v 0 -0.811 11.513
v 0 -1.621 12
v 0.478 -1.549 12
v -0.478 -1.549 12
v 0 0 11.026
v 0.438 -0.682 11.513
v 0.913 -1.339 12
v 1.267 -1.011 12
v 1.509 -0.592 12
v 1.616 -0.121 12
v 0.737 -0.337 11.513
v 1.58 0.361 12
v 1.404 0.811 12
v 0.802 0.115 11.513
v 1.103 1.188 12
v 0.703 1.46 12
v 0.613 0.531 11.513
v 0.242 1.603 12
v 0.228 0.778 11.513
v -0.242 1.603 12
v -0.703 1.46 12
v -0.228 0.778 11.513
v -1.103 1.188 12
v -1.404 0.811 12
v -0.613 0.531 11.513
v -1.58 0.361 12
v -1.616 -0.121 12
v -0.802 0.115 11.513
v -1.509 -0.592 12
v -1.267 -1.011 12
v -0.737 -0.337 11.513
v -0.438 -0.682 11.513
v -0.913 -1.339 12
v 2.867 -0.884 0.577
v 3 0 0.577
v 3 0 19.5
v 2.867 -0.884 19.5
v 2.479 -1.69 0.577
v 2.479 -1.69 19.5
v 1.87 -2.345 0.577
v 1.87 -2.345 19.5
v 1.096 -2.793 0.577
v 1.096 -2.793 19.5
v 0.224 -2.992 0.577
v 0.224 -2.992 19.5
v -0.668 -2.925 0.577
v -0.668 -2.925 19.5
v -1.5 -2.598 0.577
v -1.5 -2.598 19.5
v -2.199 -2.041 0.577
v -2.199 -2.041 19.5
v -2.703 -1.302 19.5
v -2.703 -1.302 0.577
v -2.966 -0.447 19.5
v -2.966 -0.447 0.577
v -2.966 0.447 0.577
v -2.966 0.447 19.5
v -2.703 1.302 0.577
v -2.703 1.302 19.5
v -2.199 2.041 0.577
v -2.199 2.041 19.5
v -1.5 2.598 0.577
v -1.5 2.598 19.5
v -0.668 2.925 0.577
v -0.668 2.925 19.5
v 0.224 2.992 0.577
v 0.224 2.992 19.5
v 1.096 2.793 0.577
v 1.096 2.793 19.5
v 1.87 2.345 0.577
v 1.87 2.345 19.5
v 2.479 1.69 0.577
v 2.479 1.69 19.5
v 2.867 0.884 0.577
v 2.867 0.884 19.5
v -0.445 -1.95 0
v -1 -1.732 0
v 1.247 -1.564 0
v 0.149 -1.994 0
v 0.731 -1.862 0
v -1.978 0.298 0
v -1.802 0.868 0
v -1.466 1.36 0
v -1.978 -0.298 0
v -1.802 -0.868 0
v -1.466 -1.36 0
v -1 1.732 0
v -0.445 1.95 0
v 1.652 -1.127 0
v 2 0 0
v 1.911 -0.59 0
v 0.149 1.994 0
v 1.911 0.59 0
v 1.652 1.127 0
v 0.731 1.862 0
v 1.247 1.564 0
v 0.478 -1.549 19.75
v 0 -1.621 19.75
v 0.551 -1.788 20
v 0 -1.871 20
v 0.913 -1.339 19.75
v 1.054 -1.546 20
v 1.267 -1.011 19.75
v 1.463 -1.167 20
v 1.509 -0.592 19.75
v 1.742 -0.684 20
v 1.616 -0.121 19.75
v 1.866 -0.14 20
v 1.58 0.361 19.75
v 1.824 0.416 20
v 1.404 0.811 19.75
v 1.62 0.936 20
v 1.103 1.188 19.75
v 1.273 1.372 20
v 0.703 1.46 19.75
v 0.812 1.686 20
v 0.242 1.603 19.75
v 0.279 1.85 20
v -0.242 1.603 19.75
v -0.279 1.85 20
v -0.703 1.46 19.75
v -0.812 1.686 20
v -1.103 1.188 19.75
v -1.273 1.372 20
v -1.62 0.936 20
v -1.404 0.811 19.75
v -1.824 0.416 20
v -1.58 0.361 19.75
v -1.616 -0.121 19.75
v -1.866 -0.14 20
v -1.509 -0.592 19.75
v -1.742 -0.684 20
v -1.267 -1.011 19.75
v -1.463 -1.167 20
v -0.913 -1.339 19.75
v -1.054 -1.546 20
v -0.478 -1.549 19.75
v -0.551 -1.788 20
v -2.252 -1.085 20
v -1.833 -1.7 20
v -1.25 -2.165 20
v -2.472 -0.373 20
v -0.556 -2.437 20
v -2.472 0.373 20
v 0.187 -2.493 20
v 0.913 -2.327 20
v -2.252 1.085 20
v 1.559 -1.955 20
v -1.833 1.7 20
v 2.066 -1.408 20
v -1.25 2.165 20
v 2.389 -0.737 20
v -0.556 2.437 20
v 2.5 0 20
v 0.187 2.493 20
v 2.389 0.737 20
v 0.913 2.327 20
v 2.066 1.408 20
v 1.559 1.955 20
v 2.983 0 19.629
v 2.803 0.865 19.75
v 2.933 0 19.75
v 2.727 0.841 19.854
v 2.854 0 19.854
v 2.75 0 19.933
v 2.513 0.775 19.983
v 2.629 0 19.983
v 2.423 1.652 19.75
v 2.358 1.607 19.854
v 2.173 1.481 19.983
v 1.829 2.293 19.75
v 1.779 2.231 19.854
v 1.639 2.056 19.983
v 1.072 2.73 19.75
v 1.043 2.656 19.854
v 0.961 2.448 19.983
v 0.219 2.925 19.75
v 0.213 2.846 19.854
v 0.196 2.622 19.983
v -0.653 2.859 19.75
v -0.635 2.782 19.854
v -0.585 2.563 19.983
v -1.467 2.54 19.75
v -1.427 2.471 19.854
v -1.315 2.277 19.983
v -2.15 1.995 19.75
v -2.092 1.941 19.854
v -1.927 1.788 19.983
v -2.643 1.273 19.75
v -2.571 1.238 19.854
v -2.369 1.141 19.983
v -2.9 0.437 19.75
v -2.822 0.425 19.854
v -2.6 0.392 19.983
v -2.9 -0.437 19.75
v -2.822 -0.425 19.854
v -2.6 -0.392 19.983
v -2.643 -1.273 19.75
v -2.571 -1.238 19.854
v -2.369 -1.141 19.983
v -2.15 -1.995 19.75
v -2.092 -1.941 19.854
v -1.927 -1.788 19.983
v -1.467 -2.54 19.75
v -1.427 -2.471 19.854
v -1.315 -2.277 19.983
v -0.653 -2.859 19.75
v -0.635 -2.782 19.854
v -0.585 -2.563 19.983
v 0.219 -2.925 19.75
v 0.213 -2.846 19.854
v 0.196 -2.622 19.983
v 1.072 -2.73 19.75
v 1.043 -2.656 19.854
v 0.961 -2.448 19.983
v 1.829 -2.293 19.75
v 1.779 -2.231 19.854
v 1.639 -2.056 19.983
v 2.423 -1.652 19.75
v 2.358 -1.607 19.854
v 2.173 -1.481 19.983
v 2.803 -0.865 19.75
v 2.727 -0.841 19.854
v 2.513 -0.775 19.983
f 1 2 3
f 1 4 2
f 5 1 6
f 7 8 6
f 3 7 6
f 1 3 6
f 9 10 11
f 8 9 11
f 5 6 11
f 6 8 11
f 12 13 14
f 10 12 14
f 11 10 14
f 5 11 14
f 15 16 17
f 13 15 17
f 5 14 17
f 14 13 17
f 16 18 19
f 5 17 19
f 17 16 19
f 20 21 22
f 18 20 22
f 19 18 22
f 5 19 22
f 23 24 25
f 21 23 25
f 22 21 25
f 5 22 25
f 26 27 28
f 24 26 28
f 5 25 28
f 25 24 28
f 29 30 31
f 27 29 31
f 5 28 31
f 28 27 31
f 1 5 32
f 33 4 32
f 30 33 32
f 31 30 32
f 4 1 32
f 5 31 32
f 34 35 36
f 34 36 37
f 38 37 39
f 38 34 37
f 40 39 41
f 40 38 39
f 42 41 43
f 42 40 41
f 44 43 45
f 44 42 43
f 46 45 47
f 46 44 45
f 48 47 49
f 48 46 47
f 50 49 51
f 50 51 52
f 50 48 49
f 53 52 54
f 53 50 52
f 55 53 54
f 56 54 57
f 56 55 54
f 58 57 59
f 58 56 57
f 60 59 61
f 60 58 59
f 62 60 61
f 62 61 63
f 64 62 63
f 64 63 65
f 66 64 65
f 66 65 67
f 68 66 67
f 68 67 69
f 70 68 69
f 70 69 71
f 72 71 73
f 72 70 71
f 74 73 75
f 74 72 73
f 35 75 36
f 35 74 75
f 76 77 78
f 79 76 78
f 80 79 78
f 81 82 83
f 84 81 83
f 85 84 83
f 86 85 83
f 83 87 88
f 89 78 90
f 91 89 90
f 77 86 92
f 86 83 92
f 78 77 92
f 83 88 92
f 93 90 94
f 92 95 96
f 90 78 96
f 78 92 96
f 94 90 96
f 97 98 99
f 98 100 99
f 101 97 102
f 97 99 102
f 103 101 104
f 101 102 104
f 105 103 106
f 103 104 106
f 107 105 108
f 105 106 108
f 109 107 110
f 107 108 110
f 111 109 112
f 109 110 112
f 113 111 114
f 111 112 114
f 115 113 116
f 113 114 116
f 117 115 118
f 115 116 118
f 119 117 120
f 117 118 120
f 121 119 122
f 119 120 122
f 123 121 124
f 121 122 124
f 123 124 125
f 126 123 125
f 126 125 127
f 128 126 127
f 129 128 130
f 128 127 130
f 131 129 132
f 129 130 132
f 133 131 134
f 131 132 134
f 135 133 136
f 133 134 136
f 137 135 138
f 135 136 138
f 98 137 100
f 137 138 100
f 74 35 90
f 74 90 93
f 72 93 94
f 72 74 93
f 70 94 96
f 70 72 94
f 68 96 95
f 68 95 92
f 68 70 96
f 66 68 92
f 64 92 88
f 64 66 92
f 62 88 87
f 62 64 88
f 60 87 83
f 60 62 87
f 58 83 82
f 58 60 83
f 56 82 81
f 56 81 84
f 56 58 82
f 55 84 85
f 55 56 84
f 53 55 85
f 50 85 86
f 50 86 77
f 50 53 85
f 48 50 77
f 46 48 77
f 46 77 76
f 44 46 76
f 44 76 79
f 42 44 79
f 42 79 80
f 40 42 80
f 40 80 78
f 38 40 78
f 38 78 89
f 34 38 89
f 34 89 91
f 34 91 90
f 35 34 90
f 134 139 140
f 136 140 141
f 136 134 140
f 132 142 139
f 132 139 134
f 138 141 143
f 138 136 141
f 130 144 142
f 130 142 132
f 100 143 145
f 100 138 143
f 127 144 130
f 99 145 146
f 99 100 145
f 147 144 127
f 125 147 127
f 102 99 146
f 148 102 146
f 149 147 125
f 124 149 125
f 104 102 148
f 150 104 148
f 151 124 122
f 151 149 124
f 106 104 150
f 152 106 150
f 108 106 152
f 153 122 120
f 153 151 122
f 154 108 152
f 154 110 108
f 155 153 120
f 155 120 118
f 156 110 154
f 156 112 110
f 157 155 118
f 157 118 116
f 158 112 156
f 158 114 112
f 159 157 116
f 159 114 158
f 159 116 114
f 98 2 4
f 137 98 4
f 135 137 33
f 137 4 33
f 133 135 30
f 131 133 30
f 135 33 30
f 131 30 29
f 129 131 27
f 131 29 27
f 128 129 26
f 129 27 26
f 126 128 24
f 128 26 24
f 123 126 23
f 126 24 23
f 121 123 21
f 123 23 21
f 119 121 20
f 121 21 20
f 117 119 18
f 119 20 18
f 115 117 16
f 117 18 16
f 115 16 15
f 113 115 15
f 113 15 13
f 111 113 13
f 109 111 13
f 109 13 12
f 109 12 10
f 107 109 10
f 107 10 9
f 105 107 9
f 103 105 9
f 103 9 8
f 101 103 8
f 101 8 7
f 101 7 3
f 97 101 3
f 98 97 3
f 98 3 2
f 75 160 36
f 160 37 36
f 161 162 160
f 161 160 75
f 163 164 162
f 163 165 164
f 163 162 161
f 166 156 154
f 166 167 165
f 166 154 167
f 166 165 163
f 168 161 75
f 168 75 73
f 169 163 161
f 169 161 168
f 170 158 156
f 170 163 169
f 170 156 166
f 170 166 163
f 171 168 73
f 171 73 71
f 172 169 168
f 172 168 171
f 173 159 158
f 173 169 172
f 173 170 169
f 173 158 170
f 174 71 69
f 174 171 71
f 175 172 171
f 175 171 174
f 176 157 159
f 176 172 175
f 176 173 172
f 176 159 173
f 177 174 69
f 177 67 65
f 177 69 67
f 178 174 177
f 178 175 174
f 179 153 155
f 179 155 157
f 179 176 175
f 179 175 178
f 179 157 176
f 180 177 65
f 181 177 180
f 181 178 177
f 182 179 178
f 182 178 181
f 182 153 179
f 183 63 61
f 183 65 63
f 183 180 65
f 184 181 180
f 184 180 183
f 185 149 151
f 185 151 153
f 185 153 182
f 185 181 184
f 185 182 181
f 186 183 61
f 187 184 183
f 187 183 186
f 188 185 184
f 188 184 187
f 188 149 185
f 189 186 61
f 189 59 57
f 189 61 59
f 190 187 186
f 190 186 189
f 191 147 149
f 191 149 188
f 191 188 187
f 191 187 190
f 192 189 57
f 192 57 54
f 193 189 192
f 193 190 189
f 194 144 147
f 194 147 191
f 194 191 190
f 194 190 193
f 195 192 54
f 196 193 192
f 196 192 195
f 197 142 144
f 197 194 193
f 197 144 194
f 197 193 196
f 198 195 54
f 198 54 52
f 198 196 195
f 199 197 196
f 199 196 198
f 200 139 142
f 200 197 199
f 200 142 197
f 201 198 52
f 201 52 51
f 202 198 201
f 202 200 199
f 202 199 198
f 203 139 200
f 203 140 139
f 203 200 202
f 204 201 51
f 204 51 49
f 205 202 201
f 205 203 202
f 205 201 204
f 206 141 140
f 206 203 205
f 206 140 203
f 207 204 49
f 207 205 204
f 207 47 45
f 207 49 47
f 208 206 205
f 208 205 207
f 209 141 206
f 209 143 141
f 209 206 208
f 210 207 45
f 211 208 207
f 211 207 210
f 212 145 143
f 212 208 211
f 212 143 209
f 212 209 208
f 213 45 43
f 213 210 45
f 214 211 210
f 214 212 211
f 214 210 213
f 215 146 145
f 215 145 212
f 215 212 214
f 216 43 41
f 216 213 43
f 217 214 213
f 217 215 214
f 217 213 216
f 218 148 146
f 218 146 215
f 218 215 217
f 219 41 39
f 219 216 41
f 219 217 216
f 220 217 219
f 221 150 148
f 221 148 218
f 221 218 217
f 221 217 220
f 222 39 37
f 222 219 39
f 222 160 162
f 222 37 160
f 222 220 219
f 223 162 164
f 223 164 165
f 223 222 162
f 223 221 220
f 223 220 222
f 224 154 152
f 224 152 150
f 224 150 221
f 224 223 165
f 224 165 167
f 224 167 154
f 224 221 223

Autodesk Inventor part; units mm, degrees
ref_plane "YZ Plane" through (0, 0, 0) normal (1, 0, 0) x (0, 1, 0)
ref_plane "XZ Plane" through (0, 0, 0) normal (0, 1, 0) x (-1, 0, 0)
ref_plane "XY Plane" through (0, 0, 0) normal (0, 0, 1) x (1, 0, 0)
sketch "Sketch1" plane through (0, 0, 0) normal (0, 0, 1) x (1, 0, 0)
  line L0 (0, 4.2) -> (0, -4.2) projected
  line L1 (-4.2, 0) -> (4.2, 0) projected
  circle A0 centre (0, 0) radius 3
  dimension "d0" = 6
extrude "Extrusion1" add sketch "Sketch1" along normal blind 20
chamfer "Chamfer1" distance 1 angle 30 1 edges at (-3, 0, 0) measured on face at (-0.5351, 1.0949, 0)
fillet "Fillet1" radius 0.5 1 edges at (-3, 0, 20)
sketch "Sketch2" plane through (0, 0, 20) normal (0, 0, 1) x (1, 0, 0)
  circle A0 centre (0, 0) radius 2.5 projected
hole "Hole1" at (0, 0, 20) direction (0, 0, -1) diameter 3.242 depth 8 tip angle 118 thread size "M4x0.7" class "6H" standard "ANSI Metric M Profile"
chamfer "Chamfer2" distance 0.25 angle 45 1 edges at (0, 1.621, 20)
properties part number "PIN, DOWEL, PULL, 6MMODX20MM" material "Steel, 4140, Carb & Case Harden 58-60 Rc, 0.06 Dp Case"
